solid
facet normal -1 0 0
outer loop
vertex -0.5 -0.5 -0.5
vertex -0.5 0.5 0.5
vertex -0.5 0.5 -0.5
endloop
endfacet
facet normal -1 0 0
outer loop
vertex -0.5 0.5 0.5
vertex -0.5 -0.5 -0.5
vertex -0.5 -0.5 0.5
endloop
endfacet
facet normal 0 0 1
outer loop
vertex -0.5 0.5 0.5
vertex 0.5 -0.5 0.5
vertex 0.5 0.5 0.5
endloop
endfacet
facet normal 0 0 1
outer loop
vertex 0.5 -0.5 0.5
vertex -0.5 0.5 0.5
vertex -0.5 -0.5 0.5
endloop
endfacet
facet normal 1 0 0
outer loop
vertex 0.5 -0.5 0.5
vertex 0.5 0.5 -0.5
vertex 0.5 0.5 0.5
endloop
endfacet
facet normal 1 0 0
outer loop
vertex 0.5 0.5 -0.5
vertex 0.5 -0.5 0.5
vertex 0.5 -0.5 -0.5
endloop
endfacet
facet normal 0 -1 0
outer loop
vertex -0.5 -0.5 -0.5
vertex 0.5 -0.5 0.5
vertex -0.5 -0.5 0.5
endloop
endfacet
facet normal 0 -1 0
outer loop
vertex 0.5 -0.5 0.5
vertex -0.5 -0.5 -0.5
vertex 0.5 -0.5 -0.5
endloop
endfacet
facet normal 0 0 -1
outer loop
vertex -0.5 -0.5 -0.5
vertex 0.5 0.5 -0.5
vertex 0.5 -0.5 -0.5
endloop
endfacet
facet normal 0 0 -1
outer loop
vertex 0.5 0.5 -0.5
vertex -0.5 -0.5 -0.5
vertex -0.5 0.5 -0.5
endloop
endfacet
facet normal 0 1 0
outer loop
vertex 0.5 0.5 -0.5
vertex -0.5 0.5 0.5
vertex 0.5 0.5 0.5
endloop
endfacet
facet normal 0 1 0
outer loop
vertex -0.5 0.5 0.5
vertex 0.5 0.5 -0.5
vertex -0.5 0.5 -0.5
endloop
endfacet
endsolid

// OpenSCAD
// file: ../polychannel.scad
module shape3D(size, position, center=true) {
    translate(position) cube(size, center=center);
}

// See https://forum.openscad.org/Calculating-Summarize-Arrays-generate-Array-td29132.html
function partial_sum(v, n, r = 0) = n <= 0 
        ? r + v[0] 
        : partial_sum(v, n - 1, r + v[n]); 

function partial_sum_vectors(v, n, r = [0,0,0]) = partial_sum(v, n, r); 

/*
// Tests for partial_sum and partial_sum_vectors
dim = [10, 8, 2, 25, 5]; 
n = len(dim); 
x_pos = [for(i = [0:n-1]) partial_sum(dim, i)]; 
echo(x_pos); // ECHO: [10, 18, 20, 45, 50] 
echo("");
dim2 = [[10, 1], [8, 1], [2, 1], [25, 1], [5, 2]]; 
n2 = len(dim2); 
x_pos2 = [for(i = [0:n2-1]) partial_sum_vectors(dim2, i)]; 
echo(x_pos2); // ECHO: [[10, 1], [18, 2], [20, 3], [45, 4], [50, 6]]
echo("");
x_pos3 = [for(i = [0:n2-1]) partial_sum(dim2, i, [0,0,0])]; 
echo(x_pos3); // ECHO: [[10, 1], [18, 2], [20, 3], [45, 4], [50, 6]]
echo("");
*/

module polychannel_absolute_positions(sizes, positions, clr="lightblue", center=true, show_only_shapes=false) {
    if (show_only_shapes) {
        for (i = [0:len(sizes)-1]) {
            color(clr) shape3D(sizes[i], positions[i]);
        }
    } else {
        for (i = [1:len(sizes)-1]) {
            color(clr) hull() {
                shape3D(sizes[i-1], positions[i-1]);
                shape3D(sizes[i], positions[i]);
            };
        };
    }
}

module polychannel(sizes, positions=[], relative_positions=false, clr="lightblue", center=true, show_only_shapes=false) {
    if (relative_positions) {
        absolute_positions = [for(i = [0:len(sizes)-1]) partial_sum_vectors(positions, i)];
        polychannel_absolute_positions(sizes, absolute_positions, clr=clr, center=center, show_only_shapes=show_only_shapes);
    } else {
        polychannel_absolute_positions(sizes, positions, clr=clr, center=center, show_only_shapes=show_only_shapes);
    }
}


size1 = [1, 1, 1];

sizes = [
    size1,
    [0.1, 1, 1],
    5 * size1,
    [2, 0.1, 2],
    2 * size1,
    2 * size1,
    size1,
    size1,
    size1
];
positions = [
    [0, 0, 0],
    [10, 0, 0],
    [20, 0, 0],
    [20, 8, 0],
    [20, 15, 0],
    [20, 15, 10],
    [16, 15, 9.5],
    [8, 15, 2],
    [0, 15, 2]
];
relative_positions = [
    [0, 0, 0],  // All subsequent positions are relative to this position
    [10, 0, 0],
    [10, 0, 0],
    [0, 8, 0],
    [0, 7, 0],
    [0, 0, 10],
    [-4, 0, -0.5],
    [-8, 0, -7.5],
    [-8, 0, 0]
];

polychannel(sizes, positions, clr="red", show_only_shapes=true);

translate([0, -25, 0]) polychannel(sizes, positions, clr="Salmon");

translate([0, 25, 0]) polychannel(sizes, relative_positions, relative_positions=true);
// main file
use <../polychannel.scad>

eps = 0.01;
params_pos_relative = [
    ["sphr", [eps, 4, 4], [0, 0, 0], [0, [0, 0, 1]]],
    ["sphr", [eps, 4, 4], [7, 0, 0], [0, [0, 0, 1]]],
    ["sphr", [eps, 3, 3], [0, 0, 0], [0, [0, 0, 1]]],
    ["cube", [eps, 0.5, 0.5], [3, 0, 0], [0, [0, 0, 1]]],
    ["cube", [0.5, 0.5, 0.5], [5, 0, 0], [0, [0, 0, 1]]],
    ["cube", [0.5, 0.5, 0.5], [0, 4, 0], [0, [0, 0, 1]]],
];
polychannel(params_pos_relative);
